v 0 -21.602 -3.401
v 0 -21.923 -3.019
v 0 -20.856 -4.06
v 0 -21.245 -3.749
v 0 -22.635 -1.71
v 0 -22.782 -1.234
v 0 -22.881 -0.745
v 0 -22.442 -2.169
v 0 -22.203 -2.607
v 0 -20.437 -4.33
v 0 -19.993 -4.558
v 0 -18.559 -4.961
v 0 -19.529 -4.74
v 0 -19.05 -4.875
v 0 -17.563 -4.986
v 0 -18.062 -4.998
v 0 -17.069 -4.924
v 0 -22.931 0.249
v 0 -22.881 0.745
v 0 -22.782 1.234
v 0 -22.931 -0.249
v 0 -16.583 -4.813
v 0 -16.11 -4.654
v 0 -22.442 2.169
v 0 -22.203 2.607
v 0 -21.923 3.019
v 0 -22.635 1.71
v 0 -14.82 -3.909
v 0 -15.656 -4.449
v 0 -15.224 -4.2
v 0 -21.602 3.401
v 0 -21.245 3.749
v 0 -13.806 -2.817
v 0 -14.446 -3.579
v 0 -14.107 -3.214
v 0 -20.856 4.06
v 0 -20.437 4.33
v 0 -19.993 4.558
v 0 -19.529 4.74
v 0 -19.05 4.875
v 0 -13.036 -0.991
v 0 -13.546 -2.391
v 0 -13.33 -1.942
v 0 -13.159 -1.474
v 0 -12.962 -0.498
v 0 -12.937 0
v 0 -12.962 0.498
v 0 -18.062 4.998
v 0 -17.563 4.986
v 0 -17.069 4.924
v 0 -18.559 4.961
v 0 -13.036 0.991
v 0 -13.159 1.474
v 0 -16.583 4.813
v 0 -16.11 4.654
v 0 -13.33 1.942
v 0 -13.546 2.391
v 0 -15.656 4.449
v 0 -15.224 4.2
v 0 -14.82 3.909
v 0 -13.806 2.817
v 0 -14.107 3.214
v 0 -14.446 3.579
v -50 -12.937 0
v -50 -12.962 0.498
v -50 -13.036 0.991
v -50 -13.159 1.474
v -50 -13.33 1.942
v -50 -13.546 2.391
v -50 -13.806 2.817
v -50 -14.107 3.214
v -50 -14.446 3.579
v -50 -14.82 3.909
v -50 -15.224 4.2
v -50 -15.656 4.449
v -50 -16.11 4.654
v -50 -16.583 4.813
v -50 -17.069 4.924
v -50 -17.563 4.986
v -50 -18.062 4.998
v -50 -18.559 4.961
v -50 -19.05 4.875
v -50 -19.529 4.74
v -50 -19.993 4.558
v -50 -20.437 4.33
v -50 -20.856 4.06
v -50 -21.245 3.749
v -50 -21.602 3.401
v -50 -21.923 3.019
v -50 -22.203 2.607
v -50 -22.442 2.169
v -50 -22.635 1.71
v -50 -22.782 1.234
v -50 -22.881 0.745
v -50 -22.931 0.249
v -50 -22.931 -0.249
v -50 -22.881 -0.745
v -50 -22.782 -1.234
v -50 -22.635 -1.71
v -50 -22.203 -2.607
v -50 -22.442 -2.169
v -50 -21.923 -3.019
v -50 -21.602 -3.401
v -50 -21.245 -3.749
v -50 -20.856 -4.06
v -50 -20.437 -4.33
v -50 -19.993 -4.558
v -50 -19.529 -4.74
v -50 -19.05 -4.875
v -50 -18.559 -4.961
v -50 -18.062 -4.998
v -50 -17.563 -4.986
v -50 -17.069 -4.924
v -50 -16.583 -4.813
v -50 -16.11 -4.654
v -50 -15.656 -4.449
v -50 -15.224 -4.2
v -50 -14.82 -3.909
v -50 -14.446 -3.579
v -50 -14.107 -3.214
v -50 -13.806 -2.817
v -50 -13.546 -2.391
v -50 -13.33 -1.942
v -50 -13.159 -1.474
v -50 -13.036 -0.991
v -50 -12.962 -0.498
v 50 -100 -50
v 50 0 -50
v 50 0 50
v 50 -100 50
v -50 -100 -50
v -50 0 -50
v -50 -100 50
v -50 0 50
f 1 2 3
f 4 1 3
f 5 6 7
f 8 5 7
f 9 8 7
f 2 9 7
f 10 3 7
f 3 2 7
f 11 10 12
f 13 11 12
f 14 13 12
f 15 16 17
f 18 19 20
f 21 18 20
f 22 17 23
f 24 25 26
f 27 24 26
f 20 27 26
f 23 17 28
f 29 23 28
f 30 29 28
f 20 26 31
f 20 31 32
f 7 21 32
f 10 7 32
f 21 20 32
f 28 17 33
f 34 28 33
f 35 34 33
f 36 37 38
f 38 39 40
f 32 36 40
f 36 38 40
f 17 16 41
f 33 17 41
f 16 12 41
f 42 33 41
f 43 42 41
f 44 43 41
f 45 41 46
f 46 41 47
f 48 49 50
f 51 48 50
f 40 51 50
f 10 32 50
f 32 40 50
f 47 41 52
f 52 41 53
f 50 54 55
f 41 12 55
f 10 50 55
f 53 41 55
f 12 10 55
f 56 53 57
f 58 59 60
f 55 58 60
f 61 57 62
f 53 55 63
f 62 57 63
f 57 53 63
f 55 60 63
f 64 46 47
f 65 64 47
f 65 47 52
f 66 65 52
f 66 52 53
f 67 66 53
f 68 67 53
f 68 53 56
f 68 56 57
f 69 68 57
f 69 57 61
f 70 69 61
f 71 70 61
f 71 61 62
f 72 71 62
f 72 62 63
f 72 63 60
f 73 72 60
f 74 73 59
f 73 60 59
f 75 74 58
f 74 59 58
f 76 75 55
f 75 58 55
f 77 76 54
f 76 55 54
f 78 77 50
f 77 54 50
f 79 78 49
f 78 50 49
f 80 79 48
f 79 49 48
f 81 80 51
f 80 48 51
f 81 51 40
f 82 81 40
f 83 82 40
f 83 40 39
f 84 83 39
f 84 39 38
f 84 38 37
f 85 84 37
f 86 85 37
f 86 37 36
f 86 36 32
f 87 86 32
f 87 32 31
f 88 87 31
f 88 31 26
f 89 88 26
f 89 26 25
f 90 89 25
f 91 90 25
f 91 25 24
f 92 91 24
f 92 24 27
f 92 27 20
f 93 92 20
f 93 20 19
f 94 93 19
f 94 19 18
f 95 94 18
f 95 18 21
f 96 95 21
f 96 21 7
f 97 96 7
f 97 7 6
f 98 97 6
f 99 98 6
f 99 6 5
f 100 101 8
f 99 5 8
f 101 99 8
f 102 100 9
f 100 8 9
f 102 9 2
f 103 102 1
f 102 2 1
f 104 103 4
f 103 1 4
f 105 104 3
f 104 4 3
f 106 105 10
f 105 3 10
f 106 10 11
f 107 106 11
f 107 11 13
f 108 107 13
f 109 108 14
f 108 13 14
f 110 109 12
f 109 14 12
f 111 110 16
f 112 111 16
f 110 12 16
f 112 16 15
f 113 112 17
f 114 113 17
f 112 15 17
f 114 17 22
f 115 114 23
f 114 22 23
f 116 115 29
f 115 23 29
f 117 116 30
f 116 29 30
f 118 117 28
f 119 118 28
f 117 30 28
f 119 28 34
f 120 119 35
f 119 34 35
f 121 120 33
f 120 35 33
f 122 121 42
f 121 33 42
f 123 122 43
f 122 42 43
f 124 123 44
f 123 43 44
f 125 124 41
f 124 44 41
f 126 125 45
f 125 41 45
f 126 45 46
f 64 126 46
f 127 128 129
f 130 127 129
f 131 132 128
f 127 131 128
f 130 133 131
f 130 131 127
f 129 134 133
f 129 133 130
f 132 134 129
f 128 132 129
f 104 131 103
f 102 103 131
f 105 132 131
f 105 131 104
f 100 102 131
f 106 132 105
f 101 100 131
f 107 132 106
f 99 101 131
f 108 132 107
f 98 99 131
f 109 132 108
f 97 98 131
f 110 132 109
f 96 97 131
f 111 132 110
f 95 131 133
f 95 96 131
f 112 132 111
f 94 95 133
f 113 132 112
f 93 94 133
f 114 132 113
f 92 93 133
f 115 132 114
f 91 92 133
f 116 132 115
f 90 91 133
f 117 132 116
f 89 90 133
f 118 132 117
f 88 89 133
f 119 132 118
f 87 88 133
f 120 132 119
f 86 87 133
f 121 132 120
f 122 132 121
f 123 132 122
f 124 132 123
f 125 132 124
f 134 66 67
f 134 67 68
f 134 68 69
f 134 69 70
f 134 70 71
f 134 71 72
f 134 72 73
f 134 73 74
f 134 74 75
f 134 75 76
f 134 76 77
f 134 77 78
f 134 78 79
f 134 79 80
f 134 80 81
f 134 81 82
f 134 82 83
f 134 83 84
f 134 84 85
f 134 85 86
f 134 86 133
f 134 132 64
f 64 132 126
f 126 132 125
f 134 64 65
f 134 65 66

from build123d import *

# Parameters (mm, degrees)
F0_W     = 100
F0_H     = 100
F1_DEPTH = 100
F6_R     = 5
F7_DEPTH = 50.001


# Not quite as in the source:
# - a feature of the source that left no trace in its solid (it failed there, or was rolled back) is left out


with BuildPart() as f1:
    # F0 (on Front) → F1 (new body)
    with BuildSketch(Plane.XZ):
        Rectangle(F0_W, F0_H)
    extrude(amount=F1_DEPTH)

    # F6 (on Right) → F7 (cut, through all)
    with BuildSketch(Plane.YZ):
        with Locations((-17.9369883015, 0)):
            Circle(F6_R)
    extrude(amount=-F7_DEPTH, mode=Mode.SUBTRACT)


solid = f1.part
